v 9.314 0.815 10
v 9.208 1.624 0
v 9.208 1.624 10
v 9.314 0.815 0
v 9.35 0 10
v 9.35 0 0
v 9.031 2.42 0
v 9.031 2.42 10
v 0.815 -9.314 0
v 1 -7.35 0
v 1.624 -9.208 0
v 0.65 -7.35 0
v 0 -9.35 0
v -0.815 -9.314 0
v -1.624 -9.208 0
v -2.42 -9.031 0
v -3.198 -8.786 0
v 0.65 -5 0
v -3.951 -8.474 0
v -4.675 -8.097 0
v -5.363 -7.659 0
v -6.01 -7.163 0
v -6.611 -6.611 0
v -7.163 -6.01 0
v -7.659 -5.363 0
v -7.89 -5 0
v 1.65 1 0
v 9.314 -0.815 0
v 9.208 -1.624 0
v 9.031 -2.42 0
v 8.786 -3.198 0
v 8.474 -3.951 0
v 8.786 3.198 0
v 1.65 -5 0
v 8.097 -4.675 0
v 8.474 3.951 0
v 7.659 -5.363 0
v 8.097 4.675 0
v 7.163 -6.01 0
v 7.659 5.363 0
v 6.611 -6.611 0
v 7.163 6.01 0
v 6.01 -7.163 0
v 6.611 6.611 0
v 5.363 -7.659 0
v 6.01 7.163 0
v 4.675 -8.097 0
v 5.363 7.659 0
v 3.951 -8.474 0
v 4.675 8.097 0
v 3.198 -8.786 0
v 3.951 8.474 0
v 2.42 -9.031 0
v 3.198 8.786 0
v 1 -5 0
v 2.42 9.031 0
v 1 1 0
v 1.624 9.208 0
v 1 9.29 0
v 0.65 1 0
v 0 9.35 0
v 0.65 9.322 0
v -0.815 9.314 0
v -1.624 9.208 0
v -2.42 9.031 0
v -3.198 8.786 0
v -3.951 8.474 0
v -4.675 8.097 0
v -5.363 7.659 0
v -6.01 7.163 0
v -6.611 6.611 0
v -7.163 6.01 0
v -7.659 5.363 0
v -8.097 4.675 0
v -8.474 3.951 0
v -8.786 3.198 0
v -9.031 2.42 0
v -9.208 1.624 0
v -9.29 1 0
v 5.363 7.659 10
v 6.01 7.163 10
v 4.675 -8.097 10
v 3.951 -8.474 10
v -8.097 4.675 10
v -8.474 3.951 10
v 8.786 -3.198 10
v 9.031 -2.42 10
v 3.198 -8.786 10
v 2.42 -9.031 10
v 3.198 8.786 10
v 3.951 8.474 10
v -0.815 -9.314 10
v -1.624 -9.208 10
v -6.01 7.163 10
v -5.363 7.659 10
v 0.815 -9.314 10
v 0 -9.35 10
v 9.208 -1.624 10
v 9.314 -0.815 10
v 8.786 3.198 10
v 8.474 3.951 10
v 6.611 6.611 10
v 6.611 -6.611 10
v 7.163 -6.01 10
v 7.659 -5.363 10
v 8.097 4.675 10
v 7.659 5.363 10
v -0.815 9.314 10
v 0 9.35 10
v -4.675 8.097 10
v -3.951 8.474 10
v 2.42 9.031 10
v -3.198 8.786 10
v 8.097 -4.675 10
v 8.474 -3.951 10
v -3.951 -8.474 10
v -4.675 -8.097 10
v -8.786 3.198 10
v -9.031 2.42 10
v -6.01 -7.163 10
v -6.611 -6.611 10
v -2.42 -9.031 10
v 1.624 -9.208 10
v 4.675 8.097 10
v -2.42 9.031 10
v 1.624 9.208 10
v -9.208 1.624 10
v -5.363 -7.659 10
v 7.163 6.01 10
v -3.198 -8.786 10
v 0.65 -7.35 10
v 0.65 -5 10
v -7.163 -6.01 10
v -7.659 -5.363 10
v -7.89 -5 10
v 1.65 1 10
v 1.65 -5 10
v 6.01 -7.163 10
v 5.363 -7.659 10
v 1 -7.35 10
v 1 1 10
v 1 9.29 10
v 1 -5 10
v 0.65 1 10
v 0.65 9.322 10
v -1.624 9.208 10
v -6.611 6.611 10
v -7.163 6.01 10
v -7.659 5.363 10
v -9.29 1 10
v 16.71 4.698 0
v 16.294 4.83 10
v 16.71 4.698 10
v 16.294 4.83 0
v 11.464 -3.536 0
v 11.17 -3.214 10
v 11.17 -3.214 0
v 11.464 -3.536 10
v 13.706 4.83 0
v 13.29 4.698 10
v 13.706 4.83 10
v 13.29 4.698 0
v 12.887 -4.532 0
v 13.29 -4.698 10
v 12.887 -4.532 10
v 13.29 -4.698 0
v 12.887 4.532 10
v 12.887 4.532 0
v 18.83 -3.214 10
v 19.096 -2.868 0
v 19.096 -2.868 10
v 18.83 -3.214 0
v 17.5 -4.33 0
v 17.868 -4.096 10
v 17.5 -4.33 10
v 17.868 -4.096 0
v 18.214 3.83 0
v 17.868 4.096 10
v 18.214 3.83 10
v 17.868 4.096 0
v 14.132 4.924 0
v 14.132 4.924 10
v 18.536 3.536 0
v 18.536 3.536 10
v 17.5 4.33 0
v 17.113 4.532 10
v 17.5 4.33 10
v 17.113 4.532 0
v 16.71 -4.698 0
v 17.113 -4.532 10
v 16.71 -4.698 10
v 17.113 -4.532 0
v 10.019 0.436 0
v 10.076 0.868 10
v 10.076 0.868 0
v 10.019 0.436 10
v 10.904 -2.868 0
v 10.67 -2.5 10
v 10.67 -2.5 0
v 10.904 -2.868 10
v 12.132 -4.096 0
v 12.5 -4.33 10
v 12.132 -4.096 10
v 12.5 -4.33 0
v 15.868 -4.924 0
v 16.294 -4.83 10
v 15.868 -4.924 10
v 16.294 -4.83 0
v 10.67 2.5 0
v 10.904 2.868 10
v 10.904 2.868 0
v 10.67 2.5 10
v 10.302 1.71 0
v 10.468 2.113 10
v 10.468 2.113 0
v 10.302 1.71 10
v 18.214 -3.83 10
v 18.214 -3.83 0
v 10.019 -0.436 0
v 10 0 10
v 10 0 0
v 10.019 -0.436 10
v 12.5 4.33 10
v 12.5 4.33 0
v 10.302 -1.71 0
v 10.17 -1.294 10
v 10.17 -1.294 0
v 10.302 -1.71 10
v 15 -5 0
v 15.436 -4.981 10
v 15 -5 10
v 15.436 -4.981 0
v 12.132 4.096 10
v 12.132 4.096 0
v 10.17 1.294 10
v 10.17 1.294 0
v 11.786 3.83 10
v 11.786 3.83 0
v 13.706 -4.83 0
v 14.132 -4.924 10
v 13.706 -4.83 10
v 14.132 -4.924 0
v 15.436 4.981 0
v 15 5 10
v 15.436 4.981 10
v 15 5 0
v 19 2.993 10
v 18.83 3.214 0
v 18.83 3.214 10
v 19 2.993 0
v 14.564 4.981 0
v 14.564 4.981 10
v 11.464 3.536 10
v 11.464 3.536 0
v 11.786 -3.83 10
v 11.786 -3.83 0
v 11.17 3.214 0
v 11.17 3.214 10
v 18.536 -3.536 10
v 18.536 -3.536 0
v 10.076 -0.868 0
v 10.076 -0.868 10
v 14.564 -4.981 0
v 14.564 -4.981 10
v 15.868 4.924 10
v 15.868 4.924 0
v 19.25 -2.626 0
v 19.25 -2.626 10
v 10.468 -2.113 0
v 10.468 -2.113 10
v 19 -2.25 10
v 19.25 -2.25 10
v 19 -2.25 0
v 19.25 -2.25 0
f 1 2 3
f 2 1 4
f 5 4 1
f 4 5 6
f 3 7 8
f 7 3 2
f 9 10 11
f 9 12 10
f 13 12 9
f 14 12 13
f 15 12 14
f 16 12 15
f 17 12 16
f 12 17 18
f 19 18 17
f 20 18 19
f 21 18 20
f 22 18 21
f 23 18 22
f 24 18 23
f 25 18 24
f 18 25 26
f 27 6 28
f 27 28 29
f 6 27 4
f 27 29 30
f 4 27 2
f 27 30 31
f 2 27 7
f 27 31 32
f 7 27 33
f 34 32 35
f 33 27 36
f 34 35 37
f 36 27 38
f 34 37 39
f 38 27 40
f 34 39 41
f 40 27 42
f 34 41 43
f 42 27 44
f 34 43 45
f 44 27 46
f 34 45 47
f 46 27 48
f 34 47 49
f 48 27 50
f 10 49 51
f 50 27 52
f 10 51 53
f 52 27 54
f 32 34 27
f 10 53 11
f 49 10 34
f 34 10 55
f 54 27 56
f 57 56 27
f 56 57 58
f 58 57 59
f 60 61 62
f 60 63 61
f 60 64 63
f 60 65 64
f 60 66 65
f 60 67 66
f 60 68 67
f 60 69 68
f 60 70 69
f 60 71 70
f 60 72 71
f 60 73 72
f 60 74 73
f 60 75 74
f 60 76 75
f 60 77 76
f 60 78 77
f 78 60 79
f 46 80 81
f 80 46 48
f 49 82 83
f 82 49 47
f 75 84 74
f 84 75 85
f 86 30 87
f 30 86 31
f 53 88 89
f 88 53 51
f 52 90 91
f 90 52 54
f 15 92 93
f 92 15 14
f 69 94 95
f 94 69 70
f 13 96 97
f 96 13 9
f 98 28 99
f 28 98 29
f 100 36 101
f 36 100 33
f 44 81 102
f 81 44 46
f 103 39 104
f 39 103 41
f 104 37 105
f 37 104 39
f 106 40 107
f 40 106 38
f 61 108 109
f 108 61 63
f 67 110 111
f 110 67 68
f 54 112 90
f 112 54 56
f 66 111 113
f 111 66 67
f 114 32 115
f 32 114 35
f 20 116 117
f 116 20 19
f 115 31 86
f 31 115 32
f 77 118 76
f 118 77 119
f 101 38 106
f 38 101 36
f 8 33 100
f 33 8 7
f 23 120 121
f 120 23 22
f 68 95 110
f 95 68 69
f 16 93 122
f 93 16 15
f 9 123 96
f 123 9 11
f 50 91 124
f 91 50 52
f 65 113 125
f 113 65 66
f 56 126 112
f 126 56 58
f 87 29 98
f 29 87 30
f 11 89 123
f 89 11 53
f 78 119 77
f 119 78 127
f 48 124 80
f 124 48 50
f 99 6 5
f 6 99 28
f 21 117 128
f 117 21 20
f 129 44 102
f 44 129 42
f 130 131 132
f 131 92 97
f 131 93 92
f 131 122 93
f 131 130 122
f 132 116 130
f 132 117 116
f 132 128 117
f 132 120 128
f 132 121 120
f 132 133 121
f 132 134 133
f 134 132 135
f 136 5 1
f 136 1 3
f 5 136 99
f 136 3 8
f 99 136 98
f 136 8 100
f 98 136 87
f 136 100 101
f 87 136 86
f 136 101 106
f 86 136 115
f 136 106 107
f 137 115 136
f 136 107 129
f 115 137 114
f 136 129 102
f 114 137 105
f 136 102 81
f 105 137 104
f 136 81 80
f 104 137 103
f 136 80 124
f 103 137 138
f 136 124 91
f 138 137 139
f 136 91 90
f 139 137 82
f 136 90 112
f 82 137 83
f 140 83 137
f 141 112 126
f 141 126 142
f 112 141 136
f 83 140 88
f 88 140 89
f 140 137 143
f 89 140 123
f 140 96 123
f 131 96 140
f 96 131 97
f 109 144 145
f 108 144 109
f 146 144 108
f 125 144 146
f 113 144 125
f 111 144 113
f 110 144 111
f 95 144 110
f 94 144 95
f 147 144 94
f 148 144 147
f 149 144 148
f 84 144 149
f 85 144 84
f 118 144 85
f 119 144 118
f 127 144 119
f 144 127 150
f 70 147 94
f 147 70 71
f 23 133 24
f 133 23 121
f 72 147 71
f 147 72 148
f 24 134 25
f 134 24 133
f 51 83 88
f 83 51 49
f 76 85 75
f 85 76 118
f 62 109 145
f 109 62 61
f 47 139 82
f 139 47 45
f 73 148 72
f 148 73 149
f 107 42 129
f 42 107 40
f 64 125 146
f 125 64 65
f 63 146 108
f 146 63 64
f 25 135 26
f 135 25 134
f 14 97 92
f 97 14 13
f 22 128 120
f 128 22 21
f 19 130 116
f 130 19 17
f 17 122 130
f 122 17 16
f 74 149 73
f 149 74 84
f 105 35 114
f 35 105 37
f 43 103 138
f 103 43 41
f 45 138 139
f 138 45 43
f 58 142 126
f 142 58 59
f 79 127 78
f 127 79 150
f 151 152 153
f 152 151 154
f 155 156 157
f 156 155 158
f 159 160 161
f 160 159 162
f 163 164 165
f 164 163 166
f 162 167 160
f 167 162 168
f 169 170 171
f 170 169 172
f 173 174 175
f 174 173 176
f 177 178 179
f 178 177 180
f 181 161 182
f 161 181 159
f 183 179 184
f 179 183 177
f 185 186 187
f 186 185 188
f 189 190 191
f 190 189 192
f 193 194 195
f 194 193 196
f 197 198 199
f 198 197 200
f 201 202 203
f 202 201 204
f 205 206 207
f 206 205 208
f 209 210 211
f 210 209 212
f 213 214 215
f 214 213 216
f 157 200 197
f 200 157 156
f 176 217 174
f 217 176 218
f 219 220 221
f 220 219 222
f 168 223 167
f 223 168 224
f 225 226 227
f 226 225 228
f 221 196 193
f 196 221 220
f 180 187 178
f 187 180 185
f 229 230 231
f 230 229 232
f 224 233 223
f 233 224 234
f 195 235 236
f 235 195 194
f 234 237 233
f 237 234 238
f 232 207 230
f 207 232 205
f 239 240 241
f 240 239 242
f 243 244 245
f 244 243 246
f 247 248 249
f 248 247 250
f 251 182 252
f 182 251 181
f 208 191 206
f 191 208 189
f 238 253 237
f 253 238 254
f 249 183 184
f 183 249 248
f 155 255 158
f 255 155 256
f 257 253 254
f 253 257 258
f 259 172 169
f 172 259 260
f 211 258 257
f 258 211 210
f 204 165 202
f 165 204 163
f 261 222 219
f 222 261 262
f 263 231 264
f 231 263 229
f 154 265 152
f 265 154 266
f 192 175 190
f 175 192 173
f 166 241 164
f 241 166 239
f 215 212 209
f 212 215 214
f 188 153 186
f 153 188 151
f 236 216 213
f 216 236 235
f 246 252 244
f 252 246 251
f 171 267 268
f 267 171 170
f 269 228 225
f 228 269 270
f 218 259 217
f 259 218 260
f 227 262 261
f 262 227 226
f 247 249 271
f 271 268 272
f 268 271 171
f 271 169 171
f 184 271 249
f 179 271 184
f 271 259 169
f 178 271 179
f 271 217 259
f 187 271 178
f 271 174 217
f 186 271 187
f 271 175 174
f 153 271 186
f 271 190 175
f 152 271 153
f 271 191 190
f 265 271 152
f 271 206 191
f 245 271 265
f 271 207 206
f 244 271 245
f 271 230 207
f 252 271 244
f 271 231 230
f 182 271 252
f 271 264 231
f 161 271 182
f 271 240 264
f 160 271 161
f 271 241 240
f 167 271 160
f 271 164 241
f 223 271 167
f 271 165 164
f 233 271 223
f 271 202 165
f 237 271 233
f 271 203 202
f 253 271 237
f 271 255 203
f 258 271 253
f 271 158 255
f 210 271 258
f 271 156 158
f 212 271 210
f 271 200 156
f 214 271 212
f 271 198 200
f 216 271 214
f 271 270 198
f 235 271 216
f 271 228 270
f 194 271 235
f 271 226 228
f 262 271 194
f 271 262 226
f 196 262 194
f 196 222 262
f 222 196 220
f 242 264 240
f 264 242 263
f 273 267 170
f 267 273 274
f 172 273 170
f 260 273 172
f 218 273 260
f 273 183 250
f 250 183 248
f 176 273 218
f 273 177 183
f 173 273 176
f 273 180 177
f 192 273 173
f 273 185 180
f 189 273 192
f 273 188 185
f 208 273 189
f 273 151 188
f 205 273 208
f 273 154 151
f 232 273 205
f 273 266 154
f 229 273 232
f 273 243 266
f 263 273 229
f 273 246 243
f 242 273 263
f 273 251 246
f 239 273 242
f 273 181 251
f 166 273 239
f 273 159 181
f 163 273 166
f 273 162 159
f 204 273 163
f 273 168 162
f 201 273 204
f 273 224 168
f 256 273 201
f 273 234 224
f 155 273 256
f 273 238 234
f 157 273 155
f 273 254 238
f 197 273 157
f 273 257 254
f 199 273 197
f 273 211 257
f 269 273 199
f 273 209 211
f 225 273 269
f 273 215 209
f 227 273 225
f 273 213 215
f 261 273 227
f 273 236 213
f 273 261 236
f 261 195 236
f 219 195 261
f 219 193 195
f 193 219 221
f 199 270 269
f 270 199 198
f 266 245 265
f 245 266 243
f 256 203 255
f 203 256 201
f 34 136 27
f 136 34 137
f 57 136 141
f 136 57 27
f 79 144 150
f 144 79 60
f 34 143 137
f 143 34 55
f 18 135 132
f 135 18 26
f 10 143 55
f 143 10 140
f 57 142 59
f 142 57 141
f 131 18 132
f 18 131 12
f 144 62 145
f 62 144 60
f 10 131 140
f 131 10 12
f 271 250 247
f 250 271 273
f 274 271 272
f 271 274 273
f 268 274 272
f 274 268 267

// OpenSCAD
// Stand-off clip - a ring that snaps onto a round stand rod, with a separate ring for a
// piece of tubing, joined by a solid bridge. Printed flat (the ring planes are parallel to the
// XY plane) so it drops onto a rod and snaps into place. NOVEL general part.
//

stand_d  = 12.7;
tube_d   = 6;
bridge_w = 6;
height   = 10;

$fn = 72;

ring_d = stand_d + 2 * 3;          // outer diameter of the stand ring
open   = 10;                       // opening in the stand ring (-X side)
g      = min(1.5, stand_d / 2 - 3 - open / 2);   // keep the rod hole open even with the opening

t  = tube_d + 2 * 2;               // outer diameter of the tubing ring
open_t = 4.5;
g_t   = min(1.5, tube_d / 2 - 2 - open_t / 2);

difference() {
    union() {
        cylinder(h = height, d = ring_d);                 // stand ring (solid)
        translate([15, 0, 0]) cylinder(h = height, d = t);                      // tubing ring (solid)
        translate([-(bridge_w / 2), 0, 0]) cube([bridge_w, 6, height]);   // bridge
    }
    // cut the opening in the stand ring
    translate([-ring_d / 2 - 1, -open / 2, 0]) cube([open + 2, 6, height]);
    // keep a guide wall near the rod: a wall 1.5 mm thick for x in [-g, g]
    translate([-g - 1, -stand_d / 2 - 1, 0]) cube([g + 1 + 1, stand_d + 4, height]);
    // cut the opening in the tubing ring
    translate([15 + t / 2 - 1, -open_t / 2, 0]) cube([open_t + 2, 6, height]);
    // keep a guide wall near the tube centre: a wall 1.5 mm thick for x in [t / 2 - g_t - 1, t / 2 - g_t + 1]
    translate([15 + t / 2 - g_t - 2, -tube_d / 2 - 1, 0]) cube([g_t * 2 + 4, tube_d + 4, height]);
}
